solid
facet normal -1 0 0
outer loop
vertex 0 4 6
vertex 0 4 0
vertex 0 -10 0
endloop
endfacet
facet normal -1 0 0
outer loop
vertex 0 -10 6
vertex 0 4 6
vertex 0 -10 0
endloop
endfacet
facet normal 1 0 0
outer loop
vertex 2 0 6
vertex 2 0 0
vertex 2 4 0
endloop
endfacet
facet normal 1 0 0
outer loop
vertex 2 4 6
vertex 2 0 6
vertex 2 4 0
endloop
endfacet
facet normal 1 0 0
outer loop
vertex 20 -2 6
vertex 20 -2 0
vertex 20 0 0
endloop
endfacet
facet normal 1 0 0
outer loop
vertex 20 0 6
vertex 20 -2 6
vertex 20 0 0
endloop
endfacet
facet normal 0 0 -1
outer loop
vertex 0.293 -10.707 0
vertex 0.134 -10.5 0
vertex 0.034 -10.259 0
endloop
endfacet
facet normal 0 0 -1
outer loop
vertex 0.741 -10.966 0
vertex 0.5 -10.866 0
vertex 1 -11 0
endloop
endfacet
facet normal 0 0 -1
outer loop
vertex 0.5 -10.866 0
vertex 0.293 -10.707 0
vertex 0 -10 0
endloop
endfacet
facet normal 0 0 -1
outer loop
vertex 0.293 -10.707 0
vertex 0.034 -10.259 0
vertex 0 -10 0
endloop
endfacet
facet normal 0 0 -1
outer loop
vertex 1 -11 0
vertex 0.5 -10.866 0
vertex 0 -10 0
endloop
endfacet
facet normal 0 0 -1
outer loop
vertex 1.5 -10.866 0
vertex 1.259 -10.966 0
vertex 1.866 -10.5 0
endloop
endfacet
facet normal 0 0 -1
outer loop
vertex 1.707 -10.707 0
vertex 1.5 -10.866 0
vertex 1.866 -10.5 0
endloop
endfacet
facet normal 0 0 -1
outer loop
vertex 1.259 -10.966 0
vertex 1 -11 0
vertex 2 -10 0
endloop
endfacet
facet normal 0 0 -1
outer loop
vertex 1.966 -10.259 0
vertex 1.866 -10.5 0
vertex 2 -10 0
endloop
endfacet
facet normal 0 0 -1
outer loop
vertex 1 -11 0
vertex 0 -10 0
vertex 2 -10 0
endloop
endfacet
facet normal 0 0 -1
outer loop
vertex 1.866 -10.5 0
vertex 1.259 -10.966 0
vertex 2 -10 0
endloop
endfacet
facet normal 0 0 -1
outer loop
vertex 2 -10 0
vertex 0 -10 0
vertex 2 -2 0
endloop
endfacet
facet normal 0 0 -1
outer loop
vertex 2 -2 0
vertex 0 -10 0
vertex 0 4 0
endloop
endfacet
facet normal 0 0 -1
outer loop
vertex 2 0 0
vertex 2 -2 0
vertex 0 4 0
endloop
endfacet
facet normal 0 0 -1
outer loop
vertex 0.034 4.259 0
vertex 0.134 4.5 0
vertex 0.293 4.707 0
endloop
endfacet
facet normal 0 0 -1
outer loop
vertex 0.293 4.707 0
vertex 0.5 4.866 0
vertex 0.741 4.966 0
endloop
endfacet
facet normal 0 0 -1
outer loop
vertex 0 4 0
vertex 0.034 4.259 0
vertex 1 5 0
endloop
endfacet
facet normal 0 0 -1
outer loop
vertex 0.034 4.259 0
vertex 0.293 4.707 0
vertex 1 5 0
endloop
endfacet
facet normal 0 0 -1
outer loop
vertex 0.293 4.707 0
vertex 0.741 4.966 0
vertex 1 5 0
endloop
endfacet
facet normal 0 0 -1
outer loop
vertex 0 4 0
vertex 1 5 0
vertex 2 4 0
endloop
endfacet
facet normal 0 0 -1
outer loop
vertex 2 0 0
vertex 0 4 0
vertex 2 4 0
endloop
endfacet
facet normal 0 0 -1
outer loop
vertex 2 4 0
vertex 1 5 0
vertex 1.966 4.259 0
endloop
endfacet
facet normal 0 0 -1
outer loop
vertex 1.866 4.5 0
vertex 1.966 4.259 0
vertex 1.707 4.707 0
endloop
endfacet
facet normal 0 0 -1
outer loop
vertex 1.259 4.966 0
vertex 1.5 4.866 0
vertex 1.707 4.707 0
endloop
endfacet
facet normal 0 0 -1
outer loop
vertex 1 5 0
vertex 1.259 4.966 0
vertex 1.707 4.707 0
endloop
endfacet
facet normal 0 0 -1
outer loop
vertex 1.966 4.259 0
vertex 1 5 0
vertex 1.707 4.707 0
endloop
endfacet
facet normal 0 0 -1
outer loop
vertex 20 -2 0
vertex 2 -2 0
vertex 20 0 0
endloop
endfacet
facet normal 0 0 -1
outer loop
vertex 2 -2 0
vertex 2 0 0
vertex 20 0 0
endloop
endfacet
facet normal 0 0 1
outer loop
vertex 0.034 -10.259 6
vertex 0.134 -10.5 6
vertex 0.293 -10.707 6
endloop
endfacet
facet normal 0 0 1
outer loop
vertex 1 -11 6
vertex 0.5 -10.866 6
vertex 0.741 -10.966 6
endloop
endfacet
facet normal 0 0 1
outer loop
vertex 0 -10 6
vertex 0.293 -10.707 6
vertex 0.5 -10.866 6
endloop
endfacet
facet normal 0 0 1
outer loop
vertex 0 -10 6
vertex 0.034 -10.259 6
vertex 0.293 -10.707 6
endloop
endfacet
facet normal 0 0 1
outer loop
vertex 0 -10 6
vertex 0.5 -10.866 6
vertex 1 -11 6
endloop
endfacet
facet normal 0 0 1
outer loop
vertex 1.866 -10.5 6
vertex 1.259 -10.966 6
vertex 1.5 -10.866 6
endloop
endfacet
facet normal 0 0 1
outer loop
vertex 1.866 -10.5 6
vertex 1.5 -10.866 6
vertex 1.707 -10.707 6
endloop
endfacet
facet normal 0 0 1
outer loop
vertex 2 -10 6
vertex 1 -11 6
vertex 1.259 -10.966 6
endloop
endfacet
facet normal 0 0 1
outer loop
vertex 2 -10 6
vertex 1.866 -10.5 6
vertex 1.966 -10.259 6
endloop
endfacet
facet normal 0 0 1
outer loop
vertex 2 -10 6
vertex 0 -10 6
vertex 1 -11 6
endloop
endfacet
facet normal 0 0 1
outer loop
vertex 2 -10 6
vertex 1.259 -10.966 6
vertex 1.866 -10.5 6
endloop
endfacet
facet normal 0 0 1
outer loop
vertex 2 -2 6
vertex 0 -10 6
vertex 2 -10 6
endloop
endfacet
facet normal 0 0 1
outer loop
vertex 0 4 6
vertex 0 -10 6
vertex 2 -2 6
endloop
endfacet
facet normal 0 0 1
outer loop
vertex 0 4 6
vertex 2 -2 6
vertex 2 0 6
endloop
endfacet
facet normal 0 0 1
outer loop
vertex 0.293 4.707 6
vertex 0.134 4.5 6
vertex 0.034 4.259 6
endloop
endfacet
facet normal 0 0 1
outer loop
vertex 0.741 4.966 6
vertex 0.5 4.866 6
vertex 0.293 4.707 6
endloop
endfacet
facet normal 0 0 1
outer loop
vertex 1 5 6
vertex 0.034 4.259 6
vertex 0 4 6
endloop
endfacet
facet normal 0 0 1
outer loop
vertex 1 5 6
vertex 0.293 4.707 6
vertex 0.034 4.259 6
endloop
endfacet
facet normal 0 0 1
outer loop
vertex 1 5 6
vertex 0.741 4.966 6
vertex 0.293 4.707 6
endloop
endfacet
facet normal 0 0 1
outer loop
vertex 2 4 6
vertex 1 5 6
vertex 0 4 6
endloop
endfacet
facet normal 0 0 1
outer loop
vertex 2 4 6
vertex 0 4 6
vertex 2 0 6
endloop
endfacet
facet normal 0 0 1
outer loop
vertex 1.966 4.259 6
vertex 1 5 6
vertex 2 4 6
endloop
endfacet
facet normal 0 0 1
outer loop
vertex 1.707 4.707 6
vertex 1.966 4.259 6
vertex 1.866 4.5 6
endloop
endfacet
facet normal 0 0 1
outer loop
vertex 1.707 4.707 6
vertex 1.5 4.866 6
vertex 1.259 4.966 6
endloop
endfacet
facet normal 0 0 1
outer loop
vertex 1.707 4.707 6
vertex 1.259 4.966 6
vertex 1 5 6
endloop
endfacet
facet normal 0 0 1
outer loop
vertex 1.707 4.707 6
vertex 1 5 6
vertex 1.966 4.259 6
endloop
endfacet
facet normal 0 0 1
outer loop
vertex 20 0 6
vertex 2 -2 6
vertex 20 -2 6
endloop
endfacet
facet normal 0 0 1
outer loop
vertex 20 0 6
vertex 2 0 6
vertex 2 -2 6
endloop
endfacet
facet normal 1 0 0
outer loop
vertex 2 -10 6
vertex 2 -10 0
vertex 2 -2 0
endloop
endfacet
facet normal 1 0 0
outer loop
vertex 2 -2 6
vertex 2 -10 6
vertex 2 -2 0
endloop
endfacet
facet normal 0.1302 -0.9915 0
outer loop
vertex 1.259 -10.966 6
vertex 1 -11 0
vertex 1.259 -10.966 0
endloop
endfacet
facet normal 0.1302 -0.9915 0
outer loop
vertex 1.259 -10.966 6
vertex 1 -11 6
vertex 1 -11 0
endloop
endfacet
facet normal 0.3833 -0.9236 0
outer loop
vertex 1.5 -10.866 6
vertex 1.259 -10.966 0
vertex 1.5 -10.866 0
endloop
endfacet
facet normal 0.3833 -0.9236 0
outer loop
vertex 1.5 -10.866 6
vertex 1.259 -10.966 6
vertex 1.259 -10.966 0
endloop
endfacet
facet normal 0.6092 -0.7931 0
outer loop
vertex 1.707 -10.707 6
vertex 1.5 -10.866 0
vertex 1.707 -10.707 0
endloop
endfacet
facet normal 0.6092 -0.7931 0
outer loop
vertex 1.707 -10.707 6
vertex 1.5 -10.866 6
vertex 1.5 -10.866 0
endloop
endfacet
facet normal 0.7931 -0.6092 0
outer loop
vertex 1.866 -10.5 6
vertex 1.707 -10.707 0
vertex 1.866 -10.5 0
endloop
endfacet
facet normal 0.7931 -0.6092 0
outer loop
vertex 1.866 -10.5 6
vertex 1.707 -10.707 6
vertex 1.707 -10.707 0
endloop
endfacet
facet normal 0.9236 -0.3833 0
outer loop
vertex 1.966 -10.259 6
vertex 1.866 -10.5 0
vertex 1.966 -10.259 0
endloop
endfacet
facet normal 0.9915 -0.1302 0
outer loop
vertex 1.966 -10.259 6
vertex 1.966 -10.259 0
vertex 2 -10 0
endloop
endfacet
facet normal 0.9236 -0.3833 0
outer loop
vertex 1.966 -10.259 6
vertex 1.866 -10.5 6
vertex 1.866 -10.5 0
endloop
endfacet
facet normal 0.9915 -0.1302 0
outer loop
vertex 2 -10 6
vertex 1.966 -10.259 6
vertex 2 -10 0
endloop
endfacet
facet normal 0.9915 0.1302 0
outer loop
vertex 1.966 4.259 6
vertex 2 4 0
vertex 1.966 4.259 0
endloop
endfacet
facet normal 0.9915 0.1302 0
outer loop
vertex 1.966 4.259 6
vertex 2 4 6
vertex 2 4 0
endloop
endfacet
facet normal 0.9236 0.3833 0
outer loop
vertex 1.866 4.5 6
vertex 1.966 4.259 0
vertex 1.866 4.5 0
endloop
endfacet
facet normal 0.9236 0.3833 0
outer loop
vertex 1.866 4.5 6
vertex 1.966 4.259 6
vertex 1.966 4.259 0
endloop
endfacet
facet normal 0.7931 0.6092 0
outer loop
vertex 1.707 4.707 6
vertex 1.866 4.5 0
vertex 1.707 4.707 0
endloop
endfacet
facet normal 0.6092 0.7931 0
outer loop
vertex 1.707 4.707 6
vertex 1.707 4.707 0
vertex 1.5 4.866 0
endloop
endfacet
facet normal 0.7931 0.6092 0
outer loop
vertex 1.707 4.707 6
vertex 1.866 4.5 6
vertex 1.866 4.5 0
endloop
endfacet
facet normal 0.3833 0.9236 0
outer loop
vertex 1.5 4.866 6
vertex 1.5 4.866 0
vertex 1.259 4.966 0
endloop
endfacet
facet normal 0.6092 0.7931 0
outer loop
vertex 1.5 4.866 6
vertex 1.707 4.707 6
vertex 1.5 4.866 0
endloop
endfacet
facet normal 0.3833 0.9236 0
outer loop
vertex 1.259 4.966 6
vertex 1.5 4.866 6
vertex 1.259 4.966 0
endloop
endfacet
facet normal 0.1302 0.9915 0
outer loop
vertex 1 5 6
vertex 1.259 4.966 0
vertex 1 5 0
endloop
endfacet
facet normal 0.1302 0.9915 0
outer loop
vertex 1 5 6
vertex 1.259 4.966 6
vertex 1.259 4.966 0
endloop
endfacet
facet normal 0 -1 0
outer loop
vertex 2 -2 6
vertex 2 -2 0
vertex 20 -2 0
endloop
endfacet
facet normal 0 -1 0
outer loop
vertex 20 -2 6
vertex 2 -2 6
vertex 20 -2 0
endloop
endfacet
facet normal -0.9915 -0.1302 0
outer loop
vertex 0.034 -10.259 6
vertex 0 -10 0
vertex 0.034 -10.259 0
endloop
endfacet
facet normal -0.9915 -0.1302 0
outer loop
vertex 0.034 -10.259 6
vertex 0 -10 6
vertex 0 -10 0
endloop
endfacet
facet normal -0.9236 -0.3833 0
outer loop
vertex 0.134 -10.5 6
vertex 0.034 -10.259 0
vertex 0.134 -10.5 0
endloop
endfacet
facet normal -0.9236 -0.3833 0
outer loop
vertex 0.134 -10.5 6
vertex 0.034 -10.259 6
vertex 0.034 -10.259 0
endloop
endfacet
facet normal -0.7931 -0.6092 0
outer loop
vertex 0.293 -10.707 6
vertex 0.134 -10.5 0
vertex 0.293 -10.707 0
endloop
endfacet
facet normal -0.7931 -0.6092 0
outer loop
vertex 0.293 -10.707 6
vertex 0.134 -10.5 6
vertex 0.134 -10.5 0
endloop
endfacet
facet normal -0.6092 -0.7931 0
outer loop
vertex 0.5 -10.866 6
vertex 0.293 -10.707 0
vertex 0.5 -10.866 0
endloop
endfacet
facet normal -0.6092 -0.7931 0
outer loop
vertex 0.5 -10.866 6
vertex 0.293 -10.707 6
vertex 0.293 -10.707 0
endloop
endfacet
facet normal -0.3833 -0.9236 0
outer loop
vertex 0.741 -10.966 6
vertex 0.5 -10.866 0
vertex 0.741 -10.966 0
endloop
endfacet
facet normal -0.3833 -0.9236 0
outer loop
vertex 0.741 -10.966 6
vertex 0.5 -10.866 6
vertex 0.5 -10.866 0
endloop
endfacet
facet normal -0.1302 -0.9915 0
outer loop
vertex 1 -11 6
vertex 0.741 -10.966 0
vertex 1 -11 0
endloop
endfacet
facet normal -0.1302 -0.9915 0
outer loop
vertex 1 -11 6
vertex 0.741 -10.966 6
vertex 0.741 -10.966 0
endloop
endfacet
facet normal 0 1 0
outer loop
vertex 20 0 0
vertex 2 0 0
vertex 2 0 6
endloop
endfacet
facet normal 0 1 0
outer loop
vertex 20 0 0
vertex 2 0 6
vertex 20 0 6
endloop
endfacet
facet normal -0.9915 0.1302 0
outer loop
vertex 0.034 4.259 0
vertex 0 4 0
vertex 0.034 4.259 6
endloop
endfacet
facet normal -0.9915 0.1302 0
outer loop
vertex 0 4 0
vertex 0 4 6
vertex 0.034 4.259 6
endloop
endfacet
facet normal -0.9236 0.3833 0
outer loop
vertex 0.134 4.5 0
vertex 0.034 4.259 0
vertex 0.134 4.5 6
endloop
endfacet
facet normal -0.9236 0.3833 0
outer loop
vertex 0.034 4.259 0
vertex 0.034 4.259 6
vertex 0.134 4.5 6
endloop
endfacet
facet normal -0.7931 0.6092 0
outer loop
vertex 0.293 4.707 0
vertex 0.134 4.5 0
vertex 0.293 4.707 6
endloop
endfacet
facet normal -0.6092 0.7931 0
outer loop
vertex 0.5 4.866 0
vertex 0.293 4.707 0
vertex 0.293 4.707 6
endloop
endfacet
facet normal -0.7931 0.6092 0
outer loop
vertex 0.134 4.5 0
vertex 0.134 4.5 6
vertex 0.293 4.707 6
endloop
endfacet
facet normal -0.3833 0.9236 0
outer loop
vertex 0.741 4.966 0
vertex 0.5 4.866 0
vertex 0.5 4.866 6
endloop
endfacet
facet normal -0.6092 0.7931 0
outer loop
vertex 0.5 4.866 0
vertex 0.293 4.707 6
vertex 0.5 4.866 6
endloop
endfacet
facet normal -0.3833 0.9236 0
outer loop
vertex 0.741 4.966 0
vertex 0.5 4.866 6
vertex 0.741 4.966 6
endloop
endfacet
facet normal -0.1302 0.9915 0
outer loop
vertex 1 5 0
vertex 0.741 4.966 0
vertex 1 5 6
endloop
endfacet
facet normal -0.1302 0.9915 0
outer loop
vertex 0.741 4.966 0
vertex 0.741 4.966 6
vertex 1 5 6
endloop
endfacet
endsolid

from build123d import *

# Parameters (mm, degrees)
F0_W     = 2
F0_H     = 5
F0_W_2   = 18
F0_H_2   = 2
F1_DEPTH = 6
F2_R     = 0.99999
F3_R     = 1
F4_R     = 0.99999


# Not quite as in the source:
# - a fillet or chamfer is up to 0.001 mm smaller than in the source, because OpenCascade refuses the exact size


with BuildPart() as f1:
    # F0 (on Top) → F1 (new body)
    with BuildSketch(Plane.XY):
        with Locations((1, 2.5)):
            Rectangle(F0_W, F0_H)
        with Locations((11, -1)):
            Rectangle(F0_W_2, F0_H_2)
        Polygon((2, 0), (0, 0), (0, -11), (2, -11), (2, -2), align=None)
    extrude(amount=F1_DEPTH)

    # F2 (radius 1 in the source; OpenCascade refuses exactly that, so slightly less here)
    f2_edges = [f1.edges().sort_by_distance(p)[0] for p in [
        (0, 5, 3),
        (2, 5, 3),
    ]]
    fillet(f2_edges, radius=F2_R)

    # F3
    f3_edges = [f1.edges().sort_by_distance(p)[0] for p in [
        (0, -11, 3),
    ]]
    fillet(f3_edges, radius=F3_R)

    # F4 (radius 1 in the source; OpenCascade refuses exactly that, so slightly less here)
    f4_edges = [f1.edges().sort_by_distance(p)[0] for p in [
        (2, -11, 3),
    ]]
    fillet(f4_edges, radius=F4_R)


solid = f1.part
